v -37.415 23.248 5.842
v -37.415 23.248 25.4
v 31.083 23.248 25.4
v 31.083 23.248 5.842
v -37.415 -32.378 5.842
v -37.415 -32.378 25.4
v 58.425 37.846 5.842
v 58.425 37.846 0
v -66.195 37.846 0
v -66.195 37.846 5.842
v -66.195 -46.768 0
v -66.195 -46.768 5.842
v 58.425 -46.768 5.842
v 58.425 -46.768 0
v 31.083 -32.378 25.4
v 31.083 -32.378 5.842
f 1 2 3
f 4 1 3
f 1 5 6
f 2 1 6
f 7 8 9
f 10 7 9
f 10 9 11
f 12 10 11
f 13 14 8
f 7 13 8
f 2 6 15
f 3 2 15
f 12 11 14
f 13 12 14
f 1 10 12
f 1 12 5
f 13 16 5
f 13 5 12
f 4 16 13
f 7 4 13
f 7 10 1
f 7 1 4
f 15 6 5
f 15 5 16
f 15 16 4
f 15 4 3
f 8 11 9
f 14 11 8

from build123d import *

# Parameters (mm, degrees)
F3_DEPTH = 5.842
F1_E1_W  = 68.4977713972
F1_E1_H  = 25.4
F4_DEPTH = 55.626


with BuildPart() as f3:
    # F2 (on Top) → F3 (new body)
    with BuildSketch(Plane.XY):
        Polygon((-66.1953240633, 37.8464572132), (-66.1953240633, 32.953761518), (-66.1953240633, -46.768438071), (51.8050417304, -46.768438071), (58.4245696664, -46.768438071), (58.4245696664, 37.8464572132), align=None)
    extrude(amount=F3_DEPTH)

    # F1_E1 (on explicit) → F4 (join)
    with BuildSketch(Plane(origin=(-37.4147482216, -32.3781482875, 0), x_dir=(1, 0, 0), z_dir=(0, -1, 0))):
        with Locations((34.2488856986, 12.7)):
            Rectangle(F1_E1_W, F1_E1_H)
    extrude(amount=-F4_DEPTH)


solid = f3.part
